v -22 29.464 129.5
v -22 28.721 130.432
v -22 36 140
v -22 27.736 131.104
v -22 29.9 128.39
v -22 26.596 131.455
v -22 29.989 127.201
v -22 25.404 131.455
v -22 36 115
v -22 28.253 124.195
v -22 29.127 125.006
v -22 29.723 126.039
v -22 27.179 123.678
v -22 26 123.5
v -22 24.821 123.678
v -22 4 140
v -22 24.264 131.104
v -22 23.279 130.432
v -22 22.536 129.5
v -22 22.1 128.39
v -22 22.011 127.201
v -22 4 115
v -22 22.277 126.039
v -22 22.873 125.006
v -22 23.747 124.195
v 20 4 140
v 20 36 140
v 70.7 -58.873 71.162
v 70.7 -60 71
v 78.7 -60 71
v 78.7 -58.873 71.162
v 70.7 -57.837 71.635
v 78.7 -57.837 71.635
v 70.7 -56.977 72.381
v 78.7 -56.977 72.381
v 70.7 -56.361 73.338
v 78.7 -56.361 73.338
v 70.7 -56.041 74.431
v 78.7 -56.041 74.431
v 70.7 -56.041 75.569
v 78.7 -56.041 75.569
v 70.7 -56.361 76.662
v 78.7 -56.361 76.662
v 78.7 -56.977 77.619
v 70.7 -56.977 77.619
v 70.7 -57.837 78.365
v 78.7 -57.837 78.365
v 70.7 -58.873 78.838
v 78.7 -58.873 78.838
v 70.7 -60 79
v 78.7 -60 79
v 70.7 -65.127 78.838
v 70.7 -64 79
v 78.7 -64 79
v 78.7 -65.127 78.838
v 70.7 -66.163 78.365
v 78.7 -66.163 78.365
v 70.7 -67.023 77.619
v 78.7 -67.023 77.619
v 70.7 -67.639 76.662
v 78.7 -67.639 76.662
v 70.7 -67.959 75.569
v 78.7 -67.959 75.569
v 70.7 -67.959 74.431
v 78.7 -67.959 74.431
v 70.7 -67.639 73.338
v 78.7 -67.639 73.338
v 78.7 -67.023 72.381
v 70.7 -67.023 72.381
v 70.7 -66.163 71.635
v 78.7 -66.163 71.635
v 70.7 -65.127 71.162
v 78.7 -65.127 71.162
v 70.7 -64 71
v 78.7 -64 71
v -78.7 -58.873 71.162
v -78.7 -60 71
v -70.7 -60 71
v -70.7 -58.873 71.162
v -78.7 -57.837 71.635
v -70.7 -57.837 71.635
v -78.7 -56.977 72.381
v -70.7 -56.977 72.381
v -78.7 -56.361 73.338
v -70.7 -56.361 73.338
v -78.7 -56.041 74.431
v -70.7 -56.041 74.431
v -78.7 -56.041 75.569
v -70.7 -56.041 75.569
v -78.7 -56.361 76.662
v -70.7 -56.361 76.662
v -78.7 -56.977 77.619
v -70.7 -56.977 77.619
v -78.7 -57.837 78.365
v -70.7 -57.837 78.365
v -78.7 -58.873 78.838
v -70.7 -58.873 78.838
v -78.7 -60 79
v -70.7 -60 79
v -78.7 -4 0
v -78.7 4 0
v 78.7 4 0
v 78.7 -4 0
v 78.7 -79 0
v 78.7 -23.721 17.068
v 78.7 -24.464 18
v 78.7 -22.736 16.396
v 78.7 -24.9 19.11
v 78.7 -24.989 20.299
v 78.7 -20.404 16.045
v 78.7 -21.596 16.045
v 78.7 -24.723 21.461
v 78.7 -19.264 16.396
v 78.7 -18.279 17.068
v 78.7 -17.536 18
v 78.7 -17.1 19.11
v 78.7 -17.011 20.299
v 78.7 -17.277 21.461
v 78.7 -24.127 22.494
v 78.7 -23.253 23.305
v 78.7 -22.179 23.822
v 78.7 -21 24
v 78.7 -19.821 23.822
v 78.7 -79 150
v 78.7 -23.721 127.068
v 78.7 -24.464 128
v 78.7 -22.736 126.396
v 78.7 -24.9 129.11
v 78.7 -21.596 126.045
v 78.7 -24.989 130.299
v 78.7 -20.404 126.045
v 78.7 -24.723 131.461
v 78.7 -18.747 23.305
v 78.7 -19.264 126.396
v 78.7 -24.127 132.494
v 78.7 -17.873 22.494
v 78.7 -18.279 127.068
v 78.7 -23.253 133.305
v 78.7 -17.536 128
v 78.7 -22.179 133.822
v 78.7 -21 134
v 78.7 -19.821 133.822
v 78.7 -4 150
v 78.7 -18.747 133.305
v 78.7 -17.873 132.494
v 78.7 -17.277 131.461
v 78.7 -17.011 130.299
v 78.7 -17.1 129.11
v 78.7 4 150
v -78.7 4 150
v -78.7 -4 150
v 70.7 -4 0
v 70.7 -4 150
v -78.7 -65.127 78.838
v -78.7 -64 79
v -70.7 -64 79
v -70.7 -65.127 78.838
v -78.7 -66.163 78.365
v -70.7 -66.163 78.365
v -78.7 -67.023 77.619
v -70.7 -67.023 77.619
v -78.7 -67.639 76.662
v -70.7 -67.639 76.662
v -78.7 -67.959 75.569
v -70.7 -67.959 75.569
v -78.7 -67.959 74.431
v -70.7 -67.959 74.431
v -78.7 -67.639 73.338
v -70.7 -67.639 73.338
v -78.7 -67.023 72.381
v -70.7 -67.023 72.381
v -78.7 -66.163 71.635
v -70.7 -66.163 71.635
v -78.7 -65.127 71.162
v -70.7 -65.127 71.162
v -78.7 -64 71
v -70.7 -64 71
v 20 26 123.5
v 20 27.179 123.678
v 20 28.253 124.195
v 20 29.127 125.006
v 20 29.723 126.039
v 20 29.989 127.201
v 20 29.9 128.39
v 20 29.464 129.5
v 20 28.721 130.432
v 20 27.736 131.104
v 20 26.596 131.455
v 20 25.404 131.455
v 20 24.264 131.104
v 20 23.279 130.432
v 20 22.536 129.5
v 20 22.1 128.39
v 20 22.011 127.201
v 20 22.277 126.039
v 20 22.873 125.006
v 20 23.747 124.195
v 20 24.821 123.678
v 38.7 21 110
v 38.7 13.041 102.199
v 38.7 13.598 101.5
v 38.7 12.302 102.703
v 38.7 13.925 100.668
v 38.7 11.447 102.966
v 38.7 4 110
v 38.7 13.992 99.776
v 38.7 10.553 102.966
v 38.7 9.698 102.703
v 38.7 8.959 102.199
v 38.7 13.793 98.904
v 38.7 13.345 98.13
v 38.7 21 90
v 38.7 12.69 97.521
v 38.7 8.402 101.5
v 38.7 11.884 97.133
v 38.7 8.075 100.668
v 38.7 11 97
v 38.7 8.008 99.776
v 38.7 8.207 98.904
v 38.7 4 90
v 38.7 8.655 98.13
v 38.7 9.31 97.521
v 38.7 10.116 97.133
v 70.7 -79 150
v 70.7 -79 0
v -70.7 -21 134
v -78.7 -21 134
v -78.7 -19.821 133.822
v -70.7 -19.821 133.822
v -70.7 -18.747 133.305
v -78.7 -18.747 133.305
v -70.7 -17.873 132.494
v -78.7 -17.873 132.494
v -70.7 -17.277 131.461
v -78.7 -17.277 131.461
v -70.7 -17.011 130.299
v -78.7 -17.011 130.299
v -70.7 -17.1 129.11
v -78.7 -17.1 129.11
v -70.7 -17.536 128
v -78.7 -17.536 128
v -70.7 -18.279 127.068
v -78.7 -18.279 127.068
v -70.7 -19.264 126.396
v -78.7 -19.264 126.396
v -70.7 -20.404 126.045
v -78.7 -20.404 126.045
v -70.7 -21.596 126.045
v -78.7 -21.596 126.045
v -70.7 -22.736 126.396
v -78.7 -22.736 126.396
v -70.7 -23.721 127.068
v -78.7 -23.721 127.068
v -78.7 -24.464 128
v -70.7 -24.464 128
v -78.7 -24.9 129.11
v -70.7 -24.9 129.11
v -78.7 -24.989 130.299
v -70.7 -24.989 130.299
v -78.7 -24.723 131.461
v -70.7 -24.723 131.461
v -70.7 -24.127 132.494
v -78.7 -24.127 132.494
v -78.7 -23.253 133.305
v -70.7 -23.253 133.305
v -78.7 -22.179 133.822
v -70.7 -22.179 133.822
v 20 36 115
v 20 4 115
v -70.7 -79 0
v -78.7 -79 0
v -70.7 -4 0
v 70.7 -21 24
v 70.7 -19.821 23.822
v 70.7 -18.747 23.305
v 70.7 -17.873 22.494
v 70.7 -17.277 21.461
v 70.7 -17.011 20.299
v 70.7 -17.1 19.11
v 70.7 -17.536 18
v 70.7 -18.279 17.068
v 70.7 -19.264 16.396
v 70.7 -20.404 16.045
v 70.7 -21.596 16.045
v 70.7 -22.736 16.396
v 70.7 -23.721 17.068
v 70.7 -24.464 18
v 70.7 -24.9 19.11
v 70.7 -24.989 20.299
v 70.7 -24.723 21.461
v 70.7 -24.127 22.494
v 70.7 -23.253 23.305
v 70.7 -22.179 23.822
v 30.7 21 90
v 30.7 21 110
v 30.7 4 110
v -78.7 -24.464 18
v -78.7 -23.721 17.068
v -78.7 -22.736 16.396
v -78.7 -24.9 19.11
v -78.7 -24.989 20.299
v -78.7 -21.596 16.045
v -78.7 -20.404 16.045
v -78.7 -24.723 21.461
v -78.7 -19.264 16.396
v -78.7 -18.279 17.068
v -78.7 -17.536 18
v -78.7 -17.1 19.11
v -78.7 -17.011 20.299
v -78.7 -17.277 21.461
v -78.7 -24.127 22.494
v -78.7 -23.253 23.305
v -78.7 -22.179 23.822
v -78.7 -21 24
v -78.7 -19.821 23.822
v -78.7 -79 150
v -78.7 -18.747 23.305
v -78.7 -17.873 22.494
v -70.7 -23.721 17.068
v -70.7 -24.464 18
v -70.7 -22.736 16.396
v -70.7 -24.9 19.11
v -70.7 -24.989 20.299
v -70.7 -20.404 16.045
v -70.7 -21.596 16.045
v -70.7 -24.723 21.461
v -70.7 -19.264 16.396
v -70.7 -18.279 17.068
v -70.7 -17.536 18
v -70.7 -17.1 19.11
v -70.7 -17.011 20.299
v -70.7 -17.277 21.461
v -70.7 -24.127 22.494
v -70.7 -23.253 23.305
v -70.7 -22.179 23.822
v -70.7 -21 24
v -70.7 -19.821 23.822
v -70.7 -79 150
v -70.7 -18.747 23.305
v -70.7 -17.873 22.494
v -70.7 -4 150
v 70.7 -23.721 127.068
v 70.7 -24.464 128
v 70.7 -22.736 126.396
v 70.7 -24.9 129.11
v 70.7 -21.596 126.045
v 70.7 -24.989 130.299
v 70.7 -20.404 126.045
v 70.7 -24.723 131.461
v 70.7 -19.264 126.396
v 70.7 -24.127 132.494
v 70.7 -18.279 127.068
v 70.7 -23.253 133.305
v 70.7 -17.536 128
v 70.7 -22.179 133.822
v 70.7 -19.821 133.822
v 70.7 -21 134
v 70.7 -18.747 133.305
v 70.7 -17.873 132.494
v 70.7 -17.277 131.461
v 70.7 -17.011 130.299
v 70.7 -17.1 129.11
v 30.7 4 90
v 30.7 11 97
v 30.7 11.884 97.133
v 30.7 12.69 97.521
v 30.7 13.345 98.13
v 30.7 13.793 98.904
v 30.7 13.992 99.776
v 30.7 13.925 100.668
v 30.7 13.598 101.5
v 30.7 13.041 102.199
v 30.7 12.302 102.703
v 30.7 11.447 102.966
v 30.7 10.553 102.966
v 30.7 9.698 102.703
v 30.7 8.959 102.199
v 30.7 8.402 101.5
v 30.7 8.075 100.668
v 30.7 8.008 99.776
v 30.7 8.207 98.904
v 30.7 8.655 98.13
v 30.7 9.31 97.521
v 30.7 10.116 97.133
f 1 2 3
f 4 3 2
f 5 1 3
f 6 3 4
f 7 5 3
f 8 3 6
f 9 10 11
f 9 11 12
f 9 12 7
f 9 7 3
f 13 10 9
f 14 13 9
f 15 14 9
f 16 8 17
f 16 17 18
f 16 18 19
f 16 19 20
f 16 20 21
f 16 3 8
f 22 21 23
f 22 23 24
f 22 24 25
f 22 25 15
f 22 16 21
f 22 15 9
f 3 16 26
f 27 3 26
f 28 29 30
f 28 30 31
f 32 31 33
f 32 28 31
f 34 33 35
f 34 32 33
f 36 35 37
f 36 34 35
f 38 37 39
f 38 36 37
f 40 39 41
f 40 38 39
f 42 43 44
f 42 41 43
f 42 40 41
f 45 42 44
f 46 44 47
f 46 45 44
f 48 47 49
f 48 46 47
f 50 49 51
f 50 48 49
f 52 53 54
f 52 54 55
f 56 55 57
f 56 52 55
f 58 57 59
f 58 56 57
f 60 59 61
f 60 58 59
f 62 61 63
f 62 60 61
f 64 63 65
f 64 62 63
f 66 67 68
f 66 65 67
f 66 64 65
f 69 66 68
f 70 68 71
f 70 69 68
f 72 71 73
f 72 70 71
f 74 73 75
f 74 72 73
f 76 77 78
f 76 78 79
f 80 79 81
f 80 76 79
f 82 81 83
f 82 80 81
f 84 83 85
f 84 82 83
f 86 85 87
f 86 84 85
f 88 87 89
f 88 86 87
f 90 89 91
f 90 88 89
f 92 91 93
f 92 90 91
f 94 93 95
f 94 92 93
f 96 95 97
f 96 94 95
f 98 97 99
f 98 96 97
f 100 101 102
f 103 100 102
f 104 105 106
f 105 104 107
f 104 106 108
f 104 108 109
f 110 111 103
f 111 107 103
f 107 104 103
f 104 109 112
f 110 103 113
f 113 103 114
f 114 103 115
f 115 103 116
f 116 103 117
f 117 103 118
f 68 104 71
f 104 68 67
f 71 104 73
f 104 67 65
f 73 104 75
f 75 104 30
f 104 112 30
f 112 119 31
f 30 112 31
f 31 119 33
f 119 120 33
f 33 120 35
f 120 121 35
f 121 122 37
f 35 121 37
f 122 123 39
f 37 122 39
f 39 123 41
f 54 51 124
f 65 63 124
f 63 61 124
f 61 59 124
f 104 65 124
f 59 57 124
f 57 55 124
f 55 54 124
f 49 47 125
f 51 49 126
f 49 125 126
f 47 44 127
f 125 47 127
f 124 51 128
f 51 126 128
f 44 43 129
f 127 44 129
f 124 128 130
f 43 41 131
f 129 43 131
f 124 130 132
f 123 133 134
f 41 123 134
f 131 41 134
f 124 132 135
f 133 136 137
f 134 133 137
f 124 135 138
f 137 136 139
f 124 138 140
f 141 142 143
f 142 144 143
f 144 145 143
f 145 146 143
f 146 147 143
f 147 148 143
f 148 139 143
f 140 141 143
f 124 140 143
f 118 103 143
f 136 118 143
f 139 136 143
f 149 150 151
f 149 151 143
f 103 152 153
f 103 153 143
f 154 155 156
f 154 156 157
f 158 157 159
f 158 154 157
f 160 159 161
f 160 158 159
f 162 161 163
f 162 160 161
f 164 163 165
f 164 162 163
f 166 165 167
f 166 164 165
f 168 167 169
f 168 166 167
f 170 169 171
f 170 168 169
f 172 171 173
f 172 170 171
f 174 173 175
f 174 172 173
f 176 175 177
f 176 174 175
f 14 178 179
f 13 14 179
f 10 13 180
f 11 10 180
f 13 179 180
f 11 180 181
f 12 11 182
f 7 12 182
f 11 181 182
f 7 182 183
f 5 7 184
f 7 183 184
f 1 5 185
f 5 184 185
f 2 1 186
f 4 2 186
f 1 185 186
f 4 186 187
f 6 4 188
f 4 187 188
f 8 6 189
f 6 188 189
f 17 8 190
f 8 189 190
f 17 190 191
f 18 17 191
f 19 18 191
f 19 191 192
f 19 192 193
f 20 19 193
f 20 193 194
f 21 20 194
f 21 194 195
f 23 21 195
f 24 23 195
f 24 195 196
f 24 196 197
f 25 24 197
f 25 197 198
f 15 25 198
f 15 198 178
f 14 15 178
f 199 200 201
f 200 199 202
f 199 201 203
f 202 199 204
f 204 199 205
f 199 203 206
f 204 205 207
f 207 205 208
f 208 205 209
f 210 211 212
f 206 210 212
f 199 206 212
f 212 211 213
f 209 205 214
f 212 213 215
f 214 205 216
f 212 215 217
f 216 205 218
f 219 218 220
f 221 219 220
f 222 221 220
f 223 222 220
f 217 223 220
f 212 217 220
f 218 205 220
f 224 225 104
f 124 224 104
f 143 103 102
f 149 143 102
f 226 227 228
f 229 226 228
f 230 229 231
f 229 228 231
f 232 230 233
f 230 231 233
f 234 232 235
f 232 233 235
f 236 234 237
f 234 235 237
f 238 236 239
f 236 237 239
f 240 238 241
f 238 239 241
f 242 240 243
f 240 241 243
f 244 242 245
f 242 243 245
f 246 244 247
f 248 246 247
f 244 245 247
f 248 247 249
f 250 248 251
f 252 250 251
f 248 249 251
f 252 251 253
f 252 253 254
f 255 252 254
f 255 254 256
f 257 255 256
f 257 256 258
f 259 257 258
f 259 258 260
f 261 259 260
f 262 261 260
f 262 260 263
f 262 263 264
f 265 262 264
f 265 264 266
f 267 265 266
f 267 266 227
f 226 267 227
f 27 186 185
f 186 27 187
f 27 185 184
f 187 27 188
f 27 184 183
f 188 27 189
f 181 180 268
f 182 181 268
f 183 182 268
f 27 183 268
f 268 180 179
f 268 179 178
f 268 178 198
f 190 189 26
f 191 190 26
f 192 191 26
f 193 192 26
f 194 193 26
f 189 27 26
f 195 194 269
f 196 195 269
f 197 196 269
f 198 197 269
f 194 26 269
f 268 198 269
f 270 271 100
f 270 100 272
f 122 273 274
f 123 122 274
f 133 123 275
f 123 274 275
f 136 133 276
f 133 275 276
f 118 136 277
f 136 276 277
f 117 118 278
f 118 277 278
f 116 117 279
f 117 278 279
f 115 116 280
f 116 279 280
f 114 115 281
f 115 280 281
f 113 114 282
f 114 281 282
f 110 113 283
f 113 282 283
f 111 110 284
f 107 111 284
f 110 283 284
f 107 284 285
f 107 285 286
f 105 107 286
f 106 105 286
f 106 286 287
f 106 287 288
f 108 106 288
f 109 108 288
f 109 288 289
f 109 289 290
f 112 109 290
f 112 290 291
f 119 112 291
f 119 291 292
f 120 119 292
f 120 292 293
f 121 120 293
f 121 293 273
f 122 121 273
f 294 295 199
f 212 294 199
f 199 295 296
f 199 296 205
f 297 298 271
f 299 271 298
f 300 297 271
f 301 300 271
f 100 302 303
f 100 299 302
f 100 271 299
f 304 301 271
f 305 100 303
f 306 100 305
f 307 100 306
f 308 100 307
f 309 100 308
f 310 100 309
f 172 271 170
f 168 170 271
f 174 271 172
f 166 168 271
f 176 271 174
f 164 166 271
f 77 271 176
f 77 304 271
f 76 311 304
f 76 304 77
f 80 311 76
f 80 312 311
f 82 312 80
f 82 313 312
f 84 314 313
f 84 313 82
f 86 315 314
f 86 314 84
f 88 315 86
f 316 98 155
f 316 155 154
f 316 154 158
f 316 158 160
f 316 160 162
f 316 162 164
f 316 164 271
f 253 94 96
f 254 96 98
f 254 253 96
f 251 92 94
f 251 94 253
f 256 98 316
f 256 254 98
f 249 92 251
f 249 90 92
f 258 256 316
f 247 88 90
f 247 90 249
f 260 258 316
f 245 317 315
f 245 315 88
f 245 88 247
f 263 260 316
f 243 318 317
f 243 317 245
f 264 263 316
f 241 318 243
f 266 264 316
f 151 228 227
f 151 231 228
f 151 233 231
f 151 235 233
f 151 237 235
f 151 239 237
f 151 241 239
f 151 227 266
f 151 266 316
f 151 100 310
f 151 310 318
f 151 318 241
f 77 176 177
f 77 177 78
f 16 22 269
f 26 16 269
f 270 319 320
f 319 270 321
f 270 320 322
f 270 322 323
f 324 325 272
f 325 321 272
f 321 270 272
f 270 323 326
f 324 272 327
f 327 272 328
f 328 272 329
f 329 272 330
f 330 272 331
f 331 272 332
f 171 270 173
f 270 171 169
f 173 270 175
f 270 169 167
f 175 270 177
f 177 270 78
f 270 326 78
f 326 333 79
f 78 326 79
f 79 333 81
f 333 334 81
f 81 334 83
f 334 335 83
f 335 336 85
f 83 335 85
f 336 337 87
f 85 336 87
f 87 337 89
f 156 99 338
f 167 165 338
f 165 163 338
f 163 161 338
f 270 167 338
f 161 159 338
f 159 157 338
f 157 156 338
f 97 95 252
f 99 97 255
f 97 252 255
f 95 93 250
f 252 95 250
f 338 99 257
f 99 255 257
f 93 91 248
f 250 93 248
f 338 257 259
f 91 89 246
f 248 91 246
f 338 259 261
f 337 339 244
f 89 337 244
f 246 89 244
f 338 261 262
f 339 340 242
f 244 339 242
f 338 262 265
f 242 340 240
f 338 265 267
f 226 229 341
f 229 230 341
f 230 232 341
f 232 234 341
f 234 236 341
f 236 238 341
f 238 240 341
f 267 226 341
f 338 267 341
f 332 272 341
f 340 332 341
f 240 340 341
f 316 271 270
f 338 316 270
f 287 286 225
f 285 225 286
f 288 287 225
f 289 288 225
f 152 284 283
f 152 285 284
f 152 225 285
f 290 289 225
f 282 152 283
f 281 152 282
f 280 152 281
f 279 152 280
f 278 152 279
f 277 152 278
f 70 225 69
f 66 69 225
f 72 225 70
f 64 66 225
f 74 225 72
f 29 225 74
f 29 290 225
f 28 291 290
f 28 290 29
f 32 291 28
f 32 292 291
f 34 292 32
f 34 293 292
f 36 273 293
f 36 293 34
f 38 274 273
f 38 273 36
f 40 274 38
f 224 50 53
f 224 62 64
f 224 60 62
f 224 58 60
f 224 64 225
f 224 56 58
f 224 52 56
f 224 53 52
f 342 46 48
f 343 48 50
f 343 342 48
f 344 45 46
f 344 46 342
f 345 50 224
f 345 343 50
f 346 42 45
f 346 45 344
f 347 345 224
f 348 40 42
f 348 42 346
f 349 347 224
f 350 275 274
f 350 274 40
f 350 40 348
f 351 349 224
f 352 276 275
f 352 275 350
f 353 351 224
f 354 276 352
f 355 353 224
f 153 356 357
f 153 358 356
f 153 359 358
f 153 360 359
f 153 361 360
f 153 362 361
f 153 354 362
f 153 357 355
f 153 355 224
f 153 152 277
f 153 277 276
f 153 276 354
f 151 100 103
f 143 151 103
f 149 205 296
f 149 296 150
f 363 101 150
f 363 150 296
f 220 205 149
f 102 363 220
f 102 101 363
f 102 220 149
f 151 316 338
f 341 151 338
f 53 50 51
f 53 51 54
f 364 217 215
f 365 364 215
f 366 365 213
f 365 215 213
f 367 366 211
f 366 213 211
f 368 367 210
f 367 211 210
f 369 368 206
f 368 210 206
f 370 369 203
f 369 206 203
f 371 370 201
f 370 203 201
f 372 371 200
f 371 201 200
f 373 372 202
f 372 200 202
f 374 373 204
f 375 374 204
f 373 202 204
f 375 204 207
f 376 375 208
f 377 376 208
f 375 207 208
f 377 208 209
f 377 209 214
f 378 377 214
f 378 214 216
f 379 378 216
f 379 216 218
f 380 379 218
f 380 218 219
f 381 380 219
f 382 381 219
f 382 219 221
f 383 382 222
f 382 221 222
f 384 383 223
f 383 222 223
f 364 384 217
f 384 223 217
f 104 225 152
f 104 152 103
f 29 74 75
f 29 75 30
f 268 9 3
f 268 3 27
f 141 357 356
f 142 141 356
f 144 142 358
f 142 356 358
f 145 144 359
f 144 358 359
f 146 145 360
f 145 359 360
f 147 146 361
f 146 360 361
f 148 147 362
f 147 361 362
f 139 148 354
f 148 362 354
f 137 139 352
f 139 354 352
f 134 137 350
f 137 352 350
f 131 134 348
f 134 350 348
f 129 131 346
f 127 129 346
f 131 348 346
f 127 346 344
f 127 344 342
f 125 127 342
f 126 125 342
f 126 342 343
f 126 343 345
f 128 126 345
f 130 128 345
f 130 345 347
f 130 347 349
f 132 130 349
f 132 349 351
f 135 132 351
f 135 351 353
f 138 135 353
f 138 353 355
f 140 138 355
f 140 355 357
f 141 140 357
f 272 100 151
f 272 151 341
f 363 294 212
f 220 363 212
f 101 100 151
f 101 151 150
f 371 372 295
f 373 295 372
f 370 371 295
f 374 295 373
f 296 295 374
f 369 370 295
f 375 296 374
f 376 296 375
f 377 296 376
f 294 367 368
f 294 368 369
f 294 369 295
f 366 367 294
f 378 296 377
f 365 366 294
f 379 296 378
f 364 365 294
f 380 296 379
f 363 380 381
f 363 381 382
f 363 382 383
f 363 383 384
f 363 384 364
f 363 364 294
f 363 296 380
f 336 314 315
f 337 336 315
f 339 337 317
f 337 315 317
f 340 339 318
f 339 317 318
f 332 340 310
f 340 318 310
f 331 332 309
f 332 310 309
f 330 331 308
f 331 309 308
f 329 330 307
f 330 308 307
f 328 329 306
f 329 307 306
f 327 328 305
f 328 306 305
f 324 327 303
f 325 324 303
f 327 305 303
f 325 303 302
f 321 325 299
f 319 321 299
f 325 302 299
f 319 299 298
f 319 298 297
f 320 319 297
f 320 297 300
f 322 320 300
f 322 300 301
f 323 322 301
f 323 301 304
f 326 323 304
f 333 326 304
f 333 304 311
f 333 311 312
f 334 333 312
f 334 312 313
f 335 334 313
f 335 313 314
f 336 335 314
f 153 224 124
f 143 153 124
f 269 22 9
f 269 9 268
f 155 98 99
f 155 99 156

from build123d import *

# Parameters (mm, degrees)
SKETCH1_W             = 157.4
SKETCH1_H             = 8
BOSS_EXTRUDE1_DEPTH   = 150
SKETCH2_W             = 8
SKETCH2_H             = 150
BOSS_EXTRUDE2_DEPTH   = 75
BOSS_EXTRUDE2_2_DEPTH = 75
SKETCH3_R             = 4
CUT_EXTRUDE1_DEPTH    = 232.334735827
SKETCH5_W             = 42
SKETCH5_H             = 25
BOSS_EXTRUDE3_DEPTH   = 32
SKETCH7_R             = 4
CUT_EXTRUDE2_DEPTH    = 197.17005378
SKETCH8_W             = 8
SKETCH8_H             = 20
BOSS_EXTRUDE4_DEPTH   = 17
SKETCH9_R             = 3
CUT_EXTRUDE3_DEPTH    = 8


with BuildPart() as part:
    # Sketch1 → Boss-Extrude1 (new body)
    with BuildSketch(Plane.XY):
        Rectangle(SKETCH1_W, SKETCH1_H)
    extrude(amount=BOSS_EXTRUDE1_DEPTH)

    # Sketch8 → Boss-Extrude4 (add)
    with BuildSketch(Plane(origin=(0, 4, 0), x_dir=(1, 0, 0), z_dir=(0, 1, 0))):
        with Locations((34.7, -100)):
            Rectangle(SKETCH8_W, SKETCH8_H)
    extrude(amount=BOSS_EXTRUDE4_DEPTH)

    # Sketch9 → Cut-Extrude3 (cut)
    with BuildSketch(Plane(origin=(38.7, 0, 0), x_dir=(0, 0, -1), z_dir=(1, 0, 0))):
        with Locations((-100, 11)):
            Circle(SKETCH9_R)
    extrude(amount=-CUT_EXTRUDE3_DEPTH, mode=Mode.SUBTRACT)


with BuildPart() as body_2:
    # Sketch2 → Boss-Extrude2 (new body)
    with BuildSketch(Plane.XZ.offset(4)):
        with Locations((-74.7, 75)):
            Rectangle(SKETCH2_W, SKETCH2_H)
    extrude(amount=BOSS_EXTRUDE2_DEPTH)


with BuildPart() as body_3:
    # Sketch2 → Boss-Extrude2 2 (new body)
    with BuildSketch(Plane.XZ.offset(4)):
        with Locations((74.7, 75)):
            Rectangle(SKETCH2_W, SKETCH2_H)
    extrude(amount=BOSS_EXTRUDE2_2_DEPTH)


with BuildPart() as cut_extrude1_tool:
    # Sketch3 → Cut-Extrude1 (new, through all)
    with BuildSketch(Plane.ZY.offset(78.7)):
        with Locations((130, -21)):
            Circle(SKETCH3_R)
        with Locations((20, -21)):
            Circle(SKETCH3_R)
        with BuildLine():
            Line((79, -60), (79, -64))
            ThreePointArc((79, -64), (75, -68), (71, -64))
            Line((71, -64), (71, -60))
            ThreePointArc((71, -60), (75, -56), (79, -60))
        make_face()
    extrude(amount=-CUT_EXTRUDE1_DEPTH)


with BuildPart() as body_2_1:
    add(body_2.part)

    # Cut-Extrude1: cut by cut_extrude1_tool
    add(cut_extrude1_tool.part, mode=Mode.SUBTRACT)


with BuildPart() as body_3_1:
    add(body_3.part)

    # Cut-Extrude1: cut by cut_extrude1_tool
    add(cut_extrude1_tool.part, mode=Mode.SUBTRACT)


with BuildPart() as body_4:
    # Sketch5 → Boss-Extrude3 (new body)
    with BuildSketch(Plane(origin=(0, 4, 0), x_dir=(1, 0, 0), z_dir=(0, 1, 0))):
        with Locations((-1, -127.5)):
            Rectangle(SKETCH5_W, SKETCH5_H)
    extrude(amount=BOSS_EXTRUDE3_DEPTH)

    # Sketch7 → Cut-Extrude2 (cut, through all)
    with BuildSketch(Plane(origin=(20, 0, 0), x_dir=(0, 0, -1), z_dir=(1, 0, 0))):
        with Locations((-127.5, 26)):
            Circle(SKETCH7_R)
    extrude(amount=-CUT_EXTRUDE2_DEPTH, mode=Mode.SUBTRACT)


solid = Compound([part.part, body_2_1.part, body_3_1.part, body_4.part])
